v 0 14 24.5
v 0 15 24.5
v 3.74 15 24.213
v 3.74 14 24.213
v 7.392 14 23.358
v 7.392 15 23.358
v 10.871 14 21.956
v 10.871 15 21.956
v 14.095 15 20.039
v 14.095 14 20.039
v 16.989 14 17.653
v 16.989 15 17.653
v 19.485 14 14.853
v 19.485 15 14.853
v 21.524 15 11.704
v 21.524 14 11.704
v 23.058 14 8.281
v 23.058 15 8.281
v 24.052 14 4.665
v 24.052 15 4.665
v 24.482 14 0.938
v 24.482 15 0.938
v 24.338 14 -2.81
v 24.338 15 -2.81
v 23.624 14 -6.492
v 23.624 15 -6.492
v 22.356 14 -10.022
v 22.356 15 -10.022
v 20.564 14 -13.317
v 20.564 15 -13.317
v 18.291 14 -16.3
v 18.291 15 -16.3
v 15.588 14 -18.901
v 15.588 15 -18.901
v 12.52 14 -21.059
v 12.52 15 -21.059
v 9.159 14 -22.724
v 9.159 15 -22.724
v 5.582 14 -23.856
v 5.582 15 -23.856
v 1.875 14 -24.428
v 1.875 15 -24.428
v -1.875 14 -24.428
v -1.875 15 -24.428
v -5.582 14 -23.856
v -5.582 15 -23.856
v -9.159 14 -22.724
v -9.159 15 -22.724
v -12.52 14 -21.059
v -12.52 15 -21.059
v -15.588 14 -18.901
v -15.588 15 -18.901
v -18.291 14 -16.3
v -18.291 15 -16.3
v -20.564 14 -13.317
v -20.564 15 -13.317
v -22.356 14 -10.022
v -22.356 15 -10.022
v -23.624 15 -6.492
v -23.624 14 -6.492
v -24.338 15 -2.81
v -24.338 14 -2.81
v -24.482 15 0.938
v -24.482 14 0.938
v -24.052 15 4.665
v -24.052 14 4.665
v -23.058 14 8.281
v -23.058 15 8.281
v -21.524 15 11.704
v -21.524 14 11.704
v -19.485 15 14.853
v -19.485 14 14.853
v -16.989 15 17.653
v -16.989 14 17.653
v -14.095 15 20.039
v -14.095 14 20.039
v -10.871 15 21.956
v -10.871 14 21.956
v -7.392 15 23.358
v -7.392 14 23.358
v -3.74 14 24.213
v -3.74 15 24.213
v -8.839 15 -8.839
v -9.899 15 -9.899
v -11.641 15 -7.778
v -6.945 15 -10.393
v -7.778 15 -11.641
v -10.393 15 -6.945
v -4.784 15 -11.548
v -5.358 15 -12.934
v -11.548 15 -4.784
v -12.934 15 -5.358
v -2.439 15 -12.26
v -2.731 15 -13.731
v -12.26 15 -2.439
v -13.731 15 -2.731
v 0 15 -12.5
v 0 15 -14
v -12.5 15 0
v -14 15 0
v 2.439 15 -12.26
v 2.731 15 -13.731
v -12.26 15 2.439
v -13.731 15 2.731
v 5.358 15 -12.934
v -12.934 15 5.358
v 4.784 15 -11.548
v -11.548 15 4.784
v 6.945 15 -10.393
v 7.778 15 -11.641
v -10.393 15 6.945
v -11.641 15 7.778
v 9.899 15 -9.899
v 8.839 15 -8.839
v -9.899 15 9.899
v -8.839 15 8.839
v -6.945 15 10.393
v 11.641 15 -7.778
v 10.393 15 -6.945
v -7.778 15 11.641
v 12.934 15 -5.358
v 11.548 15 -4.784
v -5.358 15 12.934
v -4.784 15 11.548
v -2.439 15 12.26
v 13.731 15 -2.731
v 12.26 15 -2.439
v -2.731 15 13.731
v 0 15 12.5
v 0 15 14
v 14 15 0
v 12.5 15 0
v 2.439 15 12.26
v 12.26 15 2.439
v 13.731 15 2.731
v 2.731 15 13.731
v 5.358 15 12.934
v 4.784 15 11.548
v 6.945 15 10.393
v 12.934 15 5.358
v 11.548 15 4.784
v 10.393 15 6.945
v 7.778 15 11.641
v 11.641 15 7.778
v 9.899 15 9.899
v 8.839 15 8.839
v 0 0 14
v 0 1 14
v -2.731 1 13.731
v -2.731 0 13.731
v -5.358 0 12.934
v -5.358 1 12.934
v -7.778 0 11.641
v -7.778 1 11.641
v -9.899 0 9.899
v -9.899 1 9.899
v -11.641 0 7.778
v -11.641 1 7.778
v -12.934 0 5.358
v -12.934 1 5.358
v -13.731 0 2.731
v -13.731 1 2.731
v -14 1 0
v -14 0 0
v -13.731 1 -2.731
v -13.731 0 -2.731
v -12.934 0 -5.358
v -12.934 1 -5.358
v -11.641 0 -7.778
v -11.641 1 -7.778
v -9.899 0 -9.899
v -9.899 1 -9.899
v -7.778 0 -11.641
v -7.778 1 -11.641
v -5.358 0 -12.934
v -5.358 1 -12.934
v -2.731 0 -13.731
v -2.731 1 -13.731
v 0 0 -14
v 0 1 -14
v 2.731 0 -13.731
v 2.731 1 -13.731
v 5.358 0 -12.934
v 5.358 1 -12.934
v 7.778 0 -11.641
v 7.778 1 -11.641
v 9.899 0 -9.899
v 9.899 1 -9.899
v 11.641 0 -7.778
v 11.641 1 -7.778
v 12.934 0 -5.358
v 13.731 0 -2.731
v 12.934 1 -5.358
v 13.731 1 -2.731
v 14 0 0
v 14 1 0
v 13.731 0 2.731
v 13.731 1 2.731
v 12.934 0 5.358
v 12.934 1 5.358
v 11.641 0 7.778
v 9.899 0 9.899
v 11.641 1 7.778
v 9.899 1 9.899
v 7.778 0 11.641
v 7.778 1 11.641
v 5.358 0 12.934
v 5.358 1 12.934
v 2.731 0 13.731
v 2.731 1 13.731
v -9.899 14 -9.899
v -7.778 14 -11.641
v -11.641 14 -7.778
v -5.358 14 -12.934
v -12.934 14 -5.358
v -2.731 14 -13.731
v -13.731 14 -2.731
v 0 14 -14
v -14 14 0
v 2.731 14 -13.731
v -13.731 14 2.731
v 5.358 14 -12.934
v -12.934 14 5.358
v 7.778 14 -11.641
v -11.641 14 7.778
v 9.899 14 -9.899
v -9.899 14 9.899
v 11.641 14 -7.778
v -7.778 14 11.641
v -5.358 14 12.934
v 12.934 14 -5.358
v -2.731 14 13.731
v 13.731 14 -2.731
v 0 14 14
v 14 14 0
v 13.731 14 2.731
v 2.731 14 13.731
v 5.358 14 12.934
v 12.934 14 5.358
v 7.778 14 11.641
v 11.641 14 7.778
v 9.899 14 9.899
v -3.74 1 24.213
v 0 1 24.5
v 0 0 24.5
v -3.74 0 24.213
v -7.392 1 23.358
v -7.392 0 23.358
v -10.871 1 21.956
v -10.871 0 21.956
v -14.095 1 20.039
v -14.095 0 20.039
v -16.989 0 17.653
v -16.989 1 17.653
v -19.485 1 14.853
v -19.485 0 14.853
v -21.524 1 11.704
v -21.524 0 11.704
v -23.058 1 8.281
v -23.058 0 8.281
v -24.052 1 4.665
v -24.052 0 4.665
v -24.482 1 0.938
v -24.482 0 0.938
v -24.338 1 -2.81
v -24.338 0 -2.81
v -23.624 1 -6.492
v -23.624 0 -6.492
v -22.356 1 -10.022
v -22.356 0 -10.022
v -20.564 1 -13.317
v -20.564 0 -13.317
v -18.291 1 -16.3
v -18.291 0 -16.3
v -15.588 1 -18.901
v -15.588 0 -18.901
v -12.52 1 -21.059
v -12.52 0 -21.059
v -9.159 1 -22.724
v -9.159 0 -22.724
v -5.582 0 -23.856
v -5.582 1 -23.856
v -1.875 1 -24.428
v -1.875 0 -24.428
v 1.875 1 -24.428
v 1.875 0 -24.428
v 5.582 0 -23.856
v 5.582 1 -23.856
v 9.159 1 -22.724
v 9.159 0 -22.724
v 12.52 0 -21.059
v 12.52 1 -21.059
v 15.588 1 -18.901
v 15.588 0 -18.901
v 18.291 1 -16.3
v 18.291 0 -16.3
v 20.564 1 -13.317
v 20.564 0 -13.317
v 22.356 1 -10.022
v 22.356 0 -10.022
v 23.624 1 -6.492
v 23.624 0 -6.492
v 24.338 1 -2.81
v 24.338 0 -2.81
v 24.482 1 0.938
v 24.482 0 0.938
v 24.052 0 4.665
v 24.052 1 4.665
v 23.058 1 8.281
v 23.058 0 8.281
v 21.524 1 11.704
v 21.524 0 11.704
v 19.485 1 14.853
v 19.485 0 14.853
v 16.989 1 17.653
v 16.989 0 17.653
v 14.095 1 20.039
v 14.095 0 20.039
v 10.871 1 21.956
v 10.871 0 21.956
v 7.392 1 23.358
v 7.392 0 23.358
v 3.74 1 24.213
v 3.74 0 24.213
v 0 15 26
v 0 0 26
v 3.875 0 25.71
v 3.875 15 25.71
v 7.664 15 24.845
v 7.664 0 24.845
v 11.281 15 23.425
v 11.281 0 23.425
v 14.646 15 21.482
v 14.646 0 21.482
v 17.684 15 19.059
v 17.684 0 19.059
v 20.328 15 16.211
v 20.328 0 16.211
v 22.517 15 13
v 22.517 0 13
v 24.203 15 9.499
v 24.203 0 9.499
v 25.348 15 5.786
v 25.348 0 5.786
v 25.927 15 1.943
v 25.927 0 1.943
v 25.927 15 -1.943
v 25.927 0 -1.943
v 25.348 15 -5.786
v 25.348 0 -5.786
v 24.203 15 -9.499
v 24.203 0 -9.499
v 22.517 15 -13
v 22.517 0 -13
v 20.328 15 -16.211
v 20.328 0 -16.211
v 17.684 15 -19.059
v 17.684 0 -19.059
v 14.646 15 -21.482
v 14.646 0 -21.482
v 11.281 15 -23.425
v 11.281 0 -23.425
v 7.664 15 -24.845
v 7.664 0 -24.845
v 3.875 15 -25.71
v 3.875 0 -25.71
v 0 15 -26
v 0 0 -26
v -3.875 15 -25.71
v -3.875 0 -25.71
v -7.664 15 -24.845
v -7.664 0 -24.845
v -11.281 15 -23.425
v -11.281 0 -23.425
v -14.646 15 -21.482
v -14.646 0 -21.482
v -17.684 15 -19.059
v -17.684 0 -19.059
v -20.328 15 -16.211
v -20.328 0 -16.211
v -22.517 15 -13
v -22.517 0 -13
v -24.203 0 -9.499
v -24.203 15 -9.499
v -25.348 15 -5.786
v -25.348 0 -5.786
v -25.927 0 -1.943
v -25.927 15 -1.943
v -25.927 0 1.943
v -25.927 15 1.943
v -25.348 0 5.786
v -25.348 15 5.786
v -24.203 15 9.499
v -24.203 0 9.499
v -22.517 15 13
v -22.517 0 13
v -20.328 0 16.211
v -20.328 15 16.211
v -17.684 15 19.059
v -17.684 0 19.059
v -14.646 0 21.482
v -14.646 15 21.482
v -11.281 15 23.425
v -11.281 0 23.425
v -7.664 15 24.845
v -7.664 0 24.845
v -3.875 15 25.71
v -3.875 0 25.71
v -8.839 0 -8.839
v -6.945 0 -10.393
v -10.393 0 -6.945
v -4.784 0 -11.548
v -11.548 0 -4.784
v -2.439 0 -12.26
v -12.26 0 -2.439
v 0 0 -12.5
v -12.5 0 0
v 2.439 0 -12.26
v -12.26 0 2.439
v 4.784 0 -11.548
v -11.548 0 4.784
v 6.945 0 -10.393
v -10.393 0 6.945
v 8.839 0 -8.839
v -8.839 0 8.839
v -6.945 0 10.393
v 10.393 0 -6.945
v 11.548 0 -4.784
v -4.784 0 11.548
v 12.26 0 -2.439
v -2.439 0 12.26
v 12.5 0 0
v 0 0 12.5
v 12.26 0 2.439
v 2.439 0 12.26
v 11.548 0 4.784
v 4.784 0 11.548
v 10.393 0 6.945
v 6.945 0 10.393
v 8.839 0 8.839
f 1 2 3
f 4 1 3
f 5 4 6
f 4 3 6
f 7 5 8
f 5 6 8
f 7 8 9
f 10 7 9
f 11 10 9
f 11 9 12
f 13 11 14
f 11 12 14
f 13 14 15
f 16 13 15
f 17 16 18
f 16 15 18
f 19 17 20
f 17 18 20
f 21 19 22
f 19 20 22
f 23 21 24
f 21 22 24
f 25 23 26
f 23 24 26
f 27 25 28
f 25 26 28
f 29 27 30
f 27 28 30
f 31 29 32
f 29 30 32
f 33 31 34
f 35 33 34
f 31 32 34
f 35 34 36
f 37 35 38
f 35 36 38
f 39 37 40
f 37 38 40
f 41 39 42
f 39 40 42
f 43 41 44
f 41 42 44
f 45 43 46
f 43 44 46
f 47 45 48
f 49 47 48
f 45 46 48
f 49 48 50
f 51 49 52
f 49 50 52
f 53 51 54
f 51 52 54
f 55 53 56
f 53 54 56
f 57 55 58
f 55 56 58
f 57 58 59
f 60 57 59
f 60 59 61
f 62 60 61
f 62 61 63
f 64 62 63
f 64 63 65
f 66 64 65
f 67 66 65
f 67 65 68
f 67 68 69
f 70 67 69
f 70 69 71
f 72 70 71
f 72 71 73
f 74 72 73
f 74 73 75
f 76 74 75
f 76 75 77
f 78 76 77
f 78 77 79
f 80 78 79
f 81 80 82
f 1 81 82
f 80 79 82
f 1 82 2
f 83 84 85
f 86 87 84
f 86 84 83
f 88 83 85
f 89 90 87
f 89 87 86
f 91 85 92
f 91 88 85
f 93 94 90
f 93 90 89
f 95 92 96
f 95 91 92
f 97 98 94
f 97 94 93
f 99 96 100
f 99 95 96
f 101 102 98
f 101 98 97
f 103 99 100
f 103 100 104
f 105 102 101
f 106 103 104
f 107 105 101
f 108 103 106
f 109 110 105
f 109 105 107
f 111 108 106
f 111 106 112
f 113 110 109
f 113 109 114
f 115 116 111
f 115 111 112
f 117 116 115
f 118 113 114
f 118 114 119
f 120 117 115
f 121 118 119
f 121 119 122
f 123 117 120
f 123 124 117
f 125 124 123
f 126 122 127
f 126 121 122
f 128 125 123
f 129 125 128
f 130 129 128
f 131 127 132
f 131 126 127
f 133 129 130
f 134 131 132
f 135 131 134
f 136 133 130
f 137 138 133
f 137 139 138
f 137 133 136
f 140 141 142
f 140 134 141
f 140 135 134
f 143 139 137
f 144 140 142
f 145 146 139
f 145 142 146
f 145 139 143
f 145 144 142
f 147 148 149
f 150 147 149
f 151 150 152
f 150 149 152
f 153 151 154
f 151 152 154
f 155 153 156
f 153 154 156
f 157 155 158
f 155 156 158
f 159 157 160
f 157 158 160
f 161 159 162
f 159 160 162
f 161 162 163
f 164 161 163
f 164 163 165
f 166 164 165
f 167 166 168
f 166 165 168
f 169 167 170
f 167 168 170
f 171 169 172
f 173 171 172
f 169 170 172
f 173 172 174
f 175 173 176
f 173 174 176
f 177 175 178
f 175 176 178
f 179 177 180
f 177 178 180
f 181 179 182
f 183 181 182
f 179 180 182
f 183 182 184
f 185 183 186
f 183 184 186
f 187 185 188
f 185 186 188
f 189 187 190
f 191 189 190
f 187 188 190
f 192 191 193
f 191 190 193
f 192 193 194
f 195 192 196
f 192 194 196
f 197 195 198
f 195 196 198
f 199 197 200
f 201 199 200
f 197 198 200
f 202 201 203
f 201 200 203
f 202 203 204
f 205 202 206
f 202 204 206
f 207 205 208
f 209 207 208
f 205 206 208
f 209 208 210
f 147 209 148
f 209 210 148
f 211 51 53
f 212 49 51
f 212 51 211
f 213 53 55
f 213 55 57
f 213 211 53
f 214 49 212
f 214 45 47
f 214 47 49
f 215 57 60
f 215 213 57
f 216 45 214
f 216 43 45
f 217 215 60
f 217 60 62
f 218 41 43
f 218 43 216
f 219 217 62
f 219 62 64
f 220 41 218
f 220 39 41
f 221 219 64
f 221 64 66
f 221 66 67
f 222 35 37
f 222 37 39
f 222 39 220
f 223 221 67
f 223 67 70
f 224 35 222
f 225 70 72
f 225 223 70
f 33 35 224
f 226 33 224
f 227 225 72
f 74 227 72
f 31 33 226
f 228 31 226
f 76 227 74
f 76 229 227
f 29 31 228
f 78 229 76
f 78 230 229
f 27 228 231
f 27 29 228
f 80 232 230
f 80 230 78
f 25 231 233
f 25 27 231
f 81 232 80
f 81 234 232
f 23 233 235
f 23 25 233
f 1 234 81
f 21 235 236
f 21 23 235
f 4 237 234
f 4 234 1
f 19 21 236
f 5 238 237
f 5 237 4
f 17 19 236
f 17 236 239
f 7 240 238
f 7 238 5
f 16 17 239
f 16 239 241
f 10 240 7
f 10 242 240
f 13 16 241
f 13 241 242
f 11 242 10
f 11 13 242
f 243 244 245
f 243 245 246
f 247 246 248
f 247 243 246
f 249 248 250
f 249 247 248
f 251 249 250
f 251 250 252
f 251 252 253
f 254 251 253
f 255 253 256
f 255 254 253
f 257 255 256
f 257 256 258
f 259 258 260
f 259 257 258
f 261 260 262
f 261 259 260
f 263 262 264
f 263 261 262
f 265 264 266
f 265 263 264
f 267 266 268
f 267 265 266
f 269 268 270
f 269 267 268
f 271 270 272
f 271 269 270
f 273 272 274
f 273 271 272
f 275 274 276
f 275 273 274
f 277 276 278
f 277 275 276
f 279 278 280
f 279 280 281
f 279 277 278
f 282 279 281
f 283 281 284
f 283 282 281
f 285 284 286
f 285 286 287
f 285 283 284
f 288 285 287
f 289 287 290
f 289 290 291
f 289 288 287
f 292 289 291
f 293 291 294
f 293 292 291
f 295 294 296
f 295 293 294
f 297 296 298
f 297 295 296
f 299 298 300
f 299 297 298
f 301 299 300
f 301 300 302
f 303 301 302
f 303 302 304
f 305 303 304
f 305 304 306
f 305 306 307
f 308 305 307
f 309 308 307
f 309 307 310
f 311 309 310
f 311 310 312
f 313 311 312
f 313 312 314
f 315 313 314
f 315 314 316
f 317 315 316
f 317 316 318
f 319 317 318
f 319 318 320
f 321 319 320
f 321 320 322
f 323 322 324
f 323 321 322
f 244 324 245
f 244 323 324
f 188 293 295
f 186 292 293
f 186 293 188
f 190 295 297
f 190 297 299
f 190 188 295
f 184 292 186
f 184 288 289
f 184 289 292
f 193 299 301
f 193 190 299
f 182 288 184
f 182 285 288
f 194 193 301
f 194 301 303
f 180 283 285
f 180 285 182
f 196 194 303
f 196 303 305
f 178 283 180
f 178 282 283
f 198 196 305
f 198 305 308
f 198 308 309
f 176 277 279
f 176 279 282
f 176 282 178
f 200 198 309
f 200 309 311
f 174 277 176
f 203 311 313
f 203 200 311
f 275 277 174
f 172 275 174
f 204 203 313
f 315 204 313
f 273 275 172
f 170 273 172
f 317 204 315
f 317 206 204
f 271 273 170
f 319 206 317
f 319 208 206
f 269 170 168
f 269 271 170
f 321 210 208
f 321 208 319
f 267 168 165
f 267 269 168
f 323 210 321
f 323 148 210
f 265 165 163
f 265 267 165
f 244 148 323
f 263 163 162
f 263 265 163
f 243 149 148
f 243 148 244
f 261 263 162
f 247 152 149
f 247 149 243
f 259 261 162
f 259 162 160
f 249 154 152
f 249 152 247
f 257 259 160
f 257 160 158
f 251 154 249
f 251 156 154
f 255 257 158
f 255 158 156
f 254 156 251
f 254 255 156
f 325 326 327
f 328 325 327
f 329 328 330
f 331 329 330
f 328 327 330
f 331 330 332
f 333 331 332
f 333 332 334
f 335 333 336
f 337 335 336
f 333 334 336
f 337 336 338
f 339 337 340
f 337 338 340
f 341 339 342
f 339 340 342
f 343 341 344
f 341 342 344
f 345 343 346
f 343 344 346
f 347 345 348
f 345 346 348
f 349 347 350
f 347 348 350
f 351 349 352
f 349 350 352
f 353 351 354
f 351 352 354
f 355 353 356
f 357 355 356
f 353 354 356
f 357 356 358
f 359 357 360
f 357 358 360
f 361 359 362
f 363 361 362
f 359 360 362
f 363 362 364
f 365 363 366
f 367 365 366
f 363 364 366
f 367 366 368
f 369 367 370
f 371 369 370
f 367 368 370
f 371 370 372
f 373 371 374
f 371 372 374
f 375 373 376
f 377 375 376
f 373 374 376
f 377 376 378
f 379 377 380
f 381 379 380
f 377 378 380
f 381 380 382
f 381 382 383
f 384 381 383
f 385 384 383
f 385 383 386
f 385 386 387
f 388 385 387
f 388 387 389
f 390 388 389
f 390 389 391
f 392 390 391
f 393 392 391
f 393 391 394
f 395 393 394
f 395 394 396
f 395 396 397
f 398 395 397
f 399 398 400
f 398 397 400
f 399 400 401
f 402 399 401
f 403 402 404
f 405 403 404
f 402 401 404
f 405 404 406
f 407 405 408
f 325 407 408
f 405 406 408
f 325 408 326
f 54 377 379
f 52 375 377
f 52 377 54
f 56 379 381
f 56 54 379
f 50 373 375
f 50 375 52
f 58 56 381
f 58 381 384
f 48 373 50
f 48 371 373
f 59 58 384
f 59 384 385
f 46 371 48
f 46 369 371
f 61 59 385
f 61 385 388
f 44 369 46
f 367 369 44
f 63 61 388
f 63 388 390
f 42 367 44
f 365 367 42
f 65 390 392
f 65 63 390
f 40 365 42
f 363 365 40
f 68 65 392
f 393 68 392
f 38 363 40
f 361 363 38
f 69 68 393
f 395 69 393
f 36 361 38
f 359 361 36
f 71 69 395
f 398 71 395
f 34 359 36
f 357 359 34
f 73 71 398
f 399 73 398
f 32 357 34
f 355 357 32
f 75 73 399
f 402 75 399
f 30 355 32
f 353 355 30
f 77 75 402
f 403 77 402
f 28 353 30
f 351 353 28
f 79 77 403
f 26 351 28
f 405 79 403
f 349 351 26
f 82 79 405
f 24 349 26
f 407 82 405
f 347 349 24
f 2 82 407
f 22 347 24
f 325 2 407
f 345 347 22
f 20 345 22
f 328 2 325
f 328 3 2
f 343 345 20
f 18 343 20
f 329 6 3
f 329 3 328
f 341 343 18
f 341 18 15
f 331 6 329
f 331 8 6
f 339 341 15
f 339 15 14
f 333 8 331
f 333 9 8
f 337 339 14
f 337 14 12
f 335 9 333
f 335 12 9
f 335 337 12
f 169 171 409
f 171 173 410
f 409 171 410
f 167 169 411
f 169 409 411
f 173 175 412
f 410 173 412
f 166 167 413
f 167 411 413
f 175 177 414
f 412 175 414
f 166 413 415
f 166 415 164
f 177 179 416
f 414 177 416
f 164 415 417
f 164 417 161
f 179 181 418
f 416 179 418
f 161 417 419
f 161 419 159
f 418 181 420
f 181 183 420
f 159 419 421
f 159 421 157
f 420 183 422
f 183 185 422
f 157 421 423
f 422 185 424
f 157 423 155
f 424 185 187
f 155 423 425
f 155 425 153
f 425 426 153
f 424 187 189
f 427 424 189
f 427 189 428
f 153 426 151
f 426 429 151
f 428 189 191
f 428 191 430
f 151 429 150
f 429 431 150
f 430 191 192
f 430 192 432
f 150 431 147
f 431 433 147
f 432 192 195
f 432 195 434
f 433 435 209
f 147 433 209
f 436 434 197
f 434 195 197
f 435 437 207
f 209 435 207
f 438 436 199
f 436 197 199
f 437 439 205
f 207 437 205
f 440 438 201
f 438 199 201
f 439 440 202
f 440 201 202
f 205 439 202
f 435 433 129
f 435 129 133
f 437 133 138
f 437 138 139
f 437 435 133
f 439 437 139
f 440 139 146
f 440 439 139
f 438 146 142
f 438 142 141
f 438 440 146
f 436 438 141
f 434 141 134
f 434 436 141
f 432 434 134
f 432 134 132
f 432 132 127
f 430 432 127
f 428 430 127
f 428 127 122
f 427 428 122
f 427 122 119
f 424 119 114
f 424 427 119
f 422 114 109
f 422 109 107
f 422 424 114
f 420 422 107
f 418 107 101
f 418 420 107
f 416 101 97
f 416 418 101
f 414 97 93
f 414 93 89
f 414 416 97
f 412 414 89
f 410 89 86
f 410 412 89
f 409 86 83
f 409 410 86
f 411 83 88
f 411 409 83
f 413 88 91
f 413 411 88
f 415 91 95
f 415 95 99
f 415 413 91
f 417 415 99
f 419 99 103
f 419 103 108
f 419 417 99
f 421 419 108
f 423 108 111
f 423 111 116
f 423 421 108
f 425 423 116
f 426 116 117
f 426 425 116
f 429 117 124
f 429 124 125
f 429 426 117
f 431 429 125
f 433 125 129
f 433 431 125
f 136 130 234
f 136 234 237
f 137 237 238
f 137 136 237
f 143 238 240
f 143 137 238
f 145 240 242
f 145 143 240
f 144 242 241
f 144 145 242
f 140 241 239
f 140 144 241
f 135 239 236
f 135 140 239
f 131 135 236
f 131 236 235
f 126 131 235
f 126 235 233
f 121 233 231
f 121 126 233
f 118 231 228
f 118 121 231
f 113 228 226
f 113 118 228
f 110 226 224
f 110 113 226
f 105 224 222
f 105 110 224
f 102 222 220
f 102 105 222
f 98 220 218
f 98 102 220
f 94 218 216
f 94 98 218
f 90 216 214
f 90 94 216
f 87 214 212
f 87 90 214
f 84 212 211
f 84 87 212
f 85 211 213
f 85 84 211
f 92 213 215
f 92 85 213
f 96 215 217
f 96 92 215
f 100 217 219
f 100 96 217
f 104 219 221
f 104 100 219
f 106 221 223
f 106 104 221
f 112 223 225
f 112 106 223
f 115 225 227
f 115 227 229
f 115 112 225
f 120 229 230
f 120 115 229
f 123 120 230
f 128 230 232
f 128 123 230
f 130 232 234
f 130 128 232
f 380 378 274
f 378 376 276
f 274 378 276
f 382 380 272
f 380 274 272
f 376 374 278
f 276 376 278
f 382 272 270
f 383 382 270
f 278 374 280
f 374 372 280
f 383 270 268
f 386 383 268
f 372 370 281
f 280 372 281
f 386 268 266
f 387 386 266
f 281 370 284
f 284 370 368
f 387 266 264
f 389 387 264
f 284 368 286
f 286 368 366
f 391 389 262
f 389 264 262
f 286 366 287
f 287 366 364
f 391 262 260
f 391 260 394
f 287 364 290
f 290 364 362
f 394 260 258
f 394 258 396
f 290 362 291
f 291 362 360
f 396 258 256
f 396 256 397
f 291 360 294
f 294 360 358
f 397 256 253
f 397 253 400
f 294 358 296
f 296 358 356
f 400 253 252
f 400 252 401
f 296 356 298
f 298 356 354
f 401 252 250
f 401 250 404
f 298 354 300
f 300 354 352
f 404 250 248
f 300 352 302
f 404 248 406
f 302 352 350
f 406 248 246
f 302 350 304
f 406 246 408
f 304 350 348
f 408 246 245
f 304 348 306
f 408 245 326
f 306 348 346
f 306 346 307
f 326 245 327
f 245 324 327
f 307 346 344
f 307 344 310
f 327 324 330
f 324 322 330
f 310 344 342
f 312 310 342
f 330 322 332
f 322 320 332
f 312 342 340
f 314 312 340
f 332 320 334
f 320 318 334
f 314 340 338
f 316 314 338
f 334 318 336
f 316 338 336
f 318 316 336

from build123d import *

# Parameters (mm, degrees)
CROQUIS1_R              = 26
CROQUIS1_R_2            = 12.5
SALIENTE_EXTRUIR1_DEPTH = 15
CROQUIS2_R              = 24.5
CROQUIS2_R_2            = 14
CORTAR_EXTRUIR1_DEPTH   = 1
CORTAR_EXTRUIR3_START   = -1
CROQUIS3_R              = 24.5
CROQUIS3_R_2            = 14
CORTAR_EXTRUIR3_DEPTH   = 1


with BuildPart() as part:
    # Croquis1 → Saliente-Extruir1 (new body)
    with BuildSketch(Plane(origin=(0, 0, 0), x_dir=(1, 0, 0), z_dir=(0, 1, 0))):
        with Locations(Location((0, 0, 0), (0, 0, 270))):
            Circle(CROQUIS1_R)
        with Locations(Location((0, 0, 0), (0, 0, 270))):
            Circle(CROQUIS1_R_2, mode=Mode.SUBTRACT)
    extrude(amount=SALIENTE_EXTRUIR1_DEPTH)

    # Croquis2 → Cortar-Extruir1 (cut)
    with BuildSketch(Plane(origin=(0, 15, 0), x_dir=(1, 0, 0), z_dir=(0, 1, 0))):
        with Locations(Location((0, 0, 0), (0, 0, 270))):
            Circle(CROQUIS2_R)
        with Locations(Location((0, 0, 0), (0, 0, 270))):
            Circle(CROQUIS2_R_2, mode=Mode.SUBTRACT)
    extrude(amount=-CORTAR_EXTRUIR1_DEPTH, mode=Mode.SUBTRACT)

    # Croquis3 → Cortar-Extruir3 (cut)
    with BuildSketch(Plane.XZ.offset(CORTAR_EXTRUIR3_START)):
        with Locations(Location((0, 0, 0), (0, 0, 90))):
            Circle(CROQUIS3_R)
        with Locations(Location((0, 0, 0), (0, 0, 90))):
            Circle(CROQUIS3_R_2, mode=Mode.SUBTRACT)
    extrude(amount=CORTAR_EXTRUIR3_DEPTH, mode=Mode.SUBTRACT)


solid = part.part
